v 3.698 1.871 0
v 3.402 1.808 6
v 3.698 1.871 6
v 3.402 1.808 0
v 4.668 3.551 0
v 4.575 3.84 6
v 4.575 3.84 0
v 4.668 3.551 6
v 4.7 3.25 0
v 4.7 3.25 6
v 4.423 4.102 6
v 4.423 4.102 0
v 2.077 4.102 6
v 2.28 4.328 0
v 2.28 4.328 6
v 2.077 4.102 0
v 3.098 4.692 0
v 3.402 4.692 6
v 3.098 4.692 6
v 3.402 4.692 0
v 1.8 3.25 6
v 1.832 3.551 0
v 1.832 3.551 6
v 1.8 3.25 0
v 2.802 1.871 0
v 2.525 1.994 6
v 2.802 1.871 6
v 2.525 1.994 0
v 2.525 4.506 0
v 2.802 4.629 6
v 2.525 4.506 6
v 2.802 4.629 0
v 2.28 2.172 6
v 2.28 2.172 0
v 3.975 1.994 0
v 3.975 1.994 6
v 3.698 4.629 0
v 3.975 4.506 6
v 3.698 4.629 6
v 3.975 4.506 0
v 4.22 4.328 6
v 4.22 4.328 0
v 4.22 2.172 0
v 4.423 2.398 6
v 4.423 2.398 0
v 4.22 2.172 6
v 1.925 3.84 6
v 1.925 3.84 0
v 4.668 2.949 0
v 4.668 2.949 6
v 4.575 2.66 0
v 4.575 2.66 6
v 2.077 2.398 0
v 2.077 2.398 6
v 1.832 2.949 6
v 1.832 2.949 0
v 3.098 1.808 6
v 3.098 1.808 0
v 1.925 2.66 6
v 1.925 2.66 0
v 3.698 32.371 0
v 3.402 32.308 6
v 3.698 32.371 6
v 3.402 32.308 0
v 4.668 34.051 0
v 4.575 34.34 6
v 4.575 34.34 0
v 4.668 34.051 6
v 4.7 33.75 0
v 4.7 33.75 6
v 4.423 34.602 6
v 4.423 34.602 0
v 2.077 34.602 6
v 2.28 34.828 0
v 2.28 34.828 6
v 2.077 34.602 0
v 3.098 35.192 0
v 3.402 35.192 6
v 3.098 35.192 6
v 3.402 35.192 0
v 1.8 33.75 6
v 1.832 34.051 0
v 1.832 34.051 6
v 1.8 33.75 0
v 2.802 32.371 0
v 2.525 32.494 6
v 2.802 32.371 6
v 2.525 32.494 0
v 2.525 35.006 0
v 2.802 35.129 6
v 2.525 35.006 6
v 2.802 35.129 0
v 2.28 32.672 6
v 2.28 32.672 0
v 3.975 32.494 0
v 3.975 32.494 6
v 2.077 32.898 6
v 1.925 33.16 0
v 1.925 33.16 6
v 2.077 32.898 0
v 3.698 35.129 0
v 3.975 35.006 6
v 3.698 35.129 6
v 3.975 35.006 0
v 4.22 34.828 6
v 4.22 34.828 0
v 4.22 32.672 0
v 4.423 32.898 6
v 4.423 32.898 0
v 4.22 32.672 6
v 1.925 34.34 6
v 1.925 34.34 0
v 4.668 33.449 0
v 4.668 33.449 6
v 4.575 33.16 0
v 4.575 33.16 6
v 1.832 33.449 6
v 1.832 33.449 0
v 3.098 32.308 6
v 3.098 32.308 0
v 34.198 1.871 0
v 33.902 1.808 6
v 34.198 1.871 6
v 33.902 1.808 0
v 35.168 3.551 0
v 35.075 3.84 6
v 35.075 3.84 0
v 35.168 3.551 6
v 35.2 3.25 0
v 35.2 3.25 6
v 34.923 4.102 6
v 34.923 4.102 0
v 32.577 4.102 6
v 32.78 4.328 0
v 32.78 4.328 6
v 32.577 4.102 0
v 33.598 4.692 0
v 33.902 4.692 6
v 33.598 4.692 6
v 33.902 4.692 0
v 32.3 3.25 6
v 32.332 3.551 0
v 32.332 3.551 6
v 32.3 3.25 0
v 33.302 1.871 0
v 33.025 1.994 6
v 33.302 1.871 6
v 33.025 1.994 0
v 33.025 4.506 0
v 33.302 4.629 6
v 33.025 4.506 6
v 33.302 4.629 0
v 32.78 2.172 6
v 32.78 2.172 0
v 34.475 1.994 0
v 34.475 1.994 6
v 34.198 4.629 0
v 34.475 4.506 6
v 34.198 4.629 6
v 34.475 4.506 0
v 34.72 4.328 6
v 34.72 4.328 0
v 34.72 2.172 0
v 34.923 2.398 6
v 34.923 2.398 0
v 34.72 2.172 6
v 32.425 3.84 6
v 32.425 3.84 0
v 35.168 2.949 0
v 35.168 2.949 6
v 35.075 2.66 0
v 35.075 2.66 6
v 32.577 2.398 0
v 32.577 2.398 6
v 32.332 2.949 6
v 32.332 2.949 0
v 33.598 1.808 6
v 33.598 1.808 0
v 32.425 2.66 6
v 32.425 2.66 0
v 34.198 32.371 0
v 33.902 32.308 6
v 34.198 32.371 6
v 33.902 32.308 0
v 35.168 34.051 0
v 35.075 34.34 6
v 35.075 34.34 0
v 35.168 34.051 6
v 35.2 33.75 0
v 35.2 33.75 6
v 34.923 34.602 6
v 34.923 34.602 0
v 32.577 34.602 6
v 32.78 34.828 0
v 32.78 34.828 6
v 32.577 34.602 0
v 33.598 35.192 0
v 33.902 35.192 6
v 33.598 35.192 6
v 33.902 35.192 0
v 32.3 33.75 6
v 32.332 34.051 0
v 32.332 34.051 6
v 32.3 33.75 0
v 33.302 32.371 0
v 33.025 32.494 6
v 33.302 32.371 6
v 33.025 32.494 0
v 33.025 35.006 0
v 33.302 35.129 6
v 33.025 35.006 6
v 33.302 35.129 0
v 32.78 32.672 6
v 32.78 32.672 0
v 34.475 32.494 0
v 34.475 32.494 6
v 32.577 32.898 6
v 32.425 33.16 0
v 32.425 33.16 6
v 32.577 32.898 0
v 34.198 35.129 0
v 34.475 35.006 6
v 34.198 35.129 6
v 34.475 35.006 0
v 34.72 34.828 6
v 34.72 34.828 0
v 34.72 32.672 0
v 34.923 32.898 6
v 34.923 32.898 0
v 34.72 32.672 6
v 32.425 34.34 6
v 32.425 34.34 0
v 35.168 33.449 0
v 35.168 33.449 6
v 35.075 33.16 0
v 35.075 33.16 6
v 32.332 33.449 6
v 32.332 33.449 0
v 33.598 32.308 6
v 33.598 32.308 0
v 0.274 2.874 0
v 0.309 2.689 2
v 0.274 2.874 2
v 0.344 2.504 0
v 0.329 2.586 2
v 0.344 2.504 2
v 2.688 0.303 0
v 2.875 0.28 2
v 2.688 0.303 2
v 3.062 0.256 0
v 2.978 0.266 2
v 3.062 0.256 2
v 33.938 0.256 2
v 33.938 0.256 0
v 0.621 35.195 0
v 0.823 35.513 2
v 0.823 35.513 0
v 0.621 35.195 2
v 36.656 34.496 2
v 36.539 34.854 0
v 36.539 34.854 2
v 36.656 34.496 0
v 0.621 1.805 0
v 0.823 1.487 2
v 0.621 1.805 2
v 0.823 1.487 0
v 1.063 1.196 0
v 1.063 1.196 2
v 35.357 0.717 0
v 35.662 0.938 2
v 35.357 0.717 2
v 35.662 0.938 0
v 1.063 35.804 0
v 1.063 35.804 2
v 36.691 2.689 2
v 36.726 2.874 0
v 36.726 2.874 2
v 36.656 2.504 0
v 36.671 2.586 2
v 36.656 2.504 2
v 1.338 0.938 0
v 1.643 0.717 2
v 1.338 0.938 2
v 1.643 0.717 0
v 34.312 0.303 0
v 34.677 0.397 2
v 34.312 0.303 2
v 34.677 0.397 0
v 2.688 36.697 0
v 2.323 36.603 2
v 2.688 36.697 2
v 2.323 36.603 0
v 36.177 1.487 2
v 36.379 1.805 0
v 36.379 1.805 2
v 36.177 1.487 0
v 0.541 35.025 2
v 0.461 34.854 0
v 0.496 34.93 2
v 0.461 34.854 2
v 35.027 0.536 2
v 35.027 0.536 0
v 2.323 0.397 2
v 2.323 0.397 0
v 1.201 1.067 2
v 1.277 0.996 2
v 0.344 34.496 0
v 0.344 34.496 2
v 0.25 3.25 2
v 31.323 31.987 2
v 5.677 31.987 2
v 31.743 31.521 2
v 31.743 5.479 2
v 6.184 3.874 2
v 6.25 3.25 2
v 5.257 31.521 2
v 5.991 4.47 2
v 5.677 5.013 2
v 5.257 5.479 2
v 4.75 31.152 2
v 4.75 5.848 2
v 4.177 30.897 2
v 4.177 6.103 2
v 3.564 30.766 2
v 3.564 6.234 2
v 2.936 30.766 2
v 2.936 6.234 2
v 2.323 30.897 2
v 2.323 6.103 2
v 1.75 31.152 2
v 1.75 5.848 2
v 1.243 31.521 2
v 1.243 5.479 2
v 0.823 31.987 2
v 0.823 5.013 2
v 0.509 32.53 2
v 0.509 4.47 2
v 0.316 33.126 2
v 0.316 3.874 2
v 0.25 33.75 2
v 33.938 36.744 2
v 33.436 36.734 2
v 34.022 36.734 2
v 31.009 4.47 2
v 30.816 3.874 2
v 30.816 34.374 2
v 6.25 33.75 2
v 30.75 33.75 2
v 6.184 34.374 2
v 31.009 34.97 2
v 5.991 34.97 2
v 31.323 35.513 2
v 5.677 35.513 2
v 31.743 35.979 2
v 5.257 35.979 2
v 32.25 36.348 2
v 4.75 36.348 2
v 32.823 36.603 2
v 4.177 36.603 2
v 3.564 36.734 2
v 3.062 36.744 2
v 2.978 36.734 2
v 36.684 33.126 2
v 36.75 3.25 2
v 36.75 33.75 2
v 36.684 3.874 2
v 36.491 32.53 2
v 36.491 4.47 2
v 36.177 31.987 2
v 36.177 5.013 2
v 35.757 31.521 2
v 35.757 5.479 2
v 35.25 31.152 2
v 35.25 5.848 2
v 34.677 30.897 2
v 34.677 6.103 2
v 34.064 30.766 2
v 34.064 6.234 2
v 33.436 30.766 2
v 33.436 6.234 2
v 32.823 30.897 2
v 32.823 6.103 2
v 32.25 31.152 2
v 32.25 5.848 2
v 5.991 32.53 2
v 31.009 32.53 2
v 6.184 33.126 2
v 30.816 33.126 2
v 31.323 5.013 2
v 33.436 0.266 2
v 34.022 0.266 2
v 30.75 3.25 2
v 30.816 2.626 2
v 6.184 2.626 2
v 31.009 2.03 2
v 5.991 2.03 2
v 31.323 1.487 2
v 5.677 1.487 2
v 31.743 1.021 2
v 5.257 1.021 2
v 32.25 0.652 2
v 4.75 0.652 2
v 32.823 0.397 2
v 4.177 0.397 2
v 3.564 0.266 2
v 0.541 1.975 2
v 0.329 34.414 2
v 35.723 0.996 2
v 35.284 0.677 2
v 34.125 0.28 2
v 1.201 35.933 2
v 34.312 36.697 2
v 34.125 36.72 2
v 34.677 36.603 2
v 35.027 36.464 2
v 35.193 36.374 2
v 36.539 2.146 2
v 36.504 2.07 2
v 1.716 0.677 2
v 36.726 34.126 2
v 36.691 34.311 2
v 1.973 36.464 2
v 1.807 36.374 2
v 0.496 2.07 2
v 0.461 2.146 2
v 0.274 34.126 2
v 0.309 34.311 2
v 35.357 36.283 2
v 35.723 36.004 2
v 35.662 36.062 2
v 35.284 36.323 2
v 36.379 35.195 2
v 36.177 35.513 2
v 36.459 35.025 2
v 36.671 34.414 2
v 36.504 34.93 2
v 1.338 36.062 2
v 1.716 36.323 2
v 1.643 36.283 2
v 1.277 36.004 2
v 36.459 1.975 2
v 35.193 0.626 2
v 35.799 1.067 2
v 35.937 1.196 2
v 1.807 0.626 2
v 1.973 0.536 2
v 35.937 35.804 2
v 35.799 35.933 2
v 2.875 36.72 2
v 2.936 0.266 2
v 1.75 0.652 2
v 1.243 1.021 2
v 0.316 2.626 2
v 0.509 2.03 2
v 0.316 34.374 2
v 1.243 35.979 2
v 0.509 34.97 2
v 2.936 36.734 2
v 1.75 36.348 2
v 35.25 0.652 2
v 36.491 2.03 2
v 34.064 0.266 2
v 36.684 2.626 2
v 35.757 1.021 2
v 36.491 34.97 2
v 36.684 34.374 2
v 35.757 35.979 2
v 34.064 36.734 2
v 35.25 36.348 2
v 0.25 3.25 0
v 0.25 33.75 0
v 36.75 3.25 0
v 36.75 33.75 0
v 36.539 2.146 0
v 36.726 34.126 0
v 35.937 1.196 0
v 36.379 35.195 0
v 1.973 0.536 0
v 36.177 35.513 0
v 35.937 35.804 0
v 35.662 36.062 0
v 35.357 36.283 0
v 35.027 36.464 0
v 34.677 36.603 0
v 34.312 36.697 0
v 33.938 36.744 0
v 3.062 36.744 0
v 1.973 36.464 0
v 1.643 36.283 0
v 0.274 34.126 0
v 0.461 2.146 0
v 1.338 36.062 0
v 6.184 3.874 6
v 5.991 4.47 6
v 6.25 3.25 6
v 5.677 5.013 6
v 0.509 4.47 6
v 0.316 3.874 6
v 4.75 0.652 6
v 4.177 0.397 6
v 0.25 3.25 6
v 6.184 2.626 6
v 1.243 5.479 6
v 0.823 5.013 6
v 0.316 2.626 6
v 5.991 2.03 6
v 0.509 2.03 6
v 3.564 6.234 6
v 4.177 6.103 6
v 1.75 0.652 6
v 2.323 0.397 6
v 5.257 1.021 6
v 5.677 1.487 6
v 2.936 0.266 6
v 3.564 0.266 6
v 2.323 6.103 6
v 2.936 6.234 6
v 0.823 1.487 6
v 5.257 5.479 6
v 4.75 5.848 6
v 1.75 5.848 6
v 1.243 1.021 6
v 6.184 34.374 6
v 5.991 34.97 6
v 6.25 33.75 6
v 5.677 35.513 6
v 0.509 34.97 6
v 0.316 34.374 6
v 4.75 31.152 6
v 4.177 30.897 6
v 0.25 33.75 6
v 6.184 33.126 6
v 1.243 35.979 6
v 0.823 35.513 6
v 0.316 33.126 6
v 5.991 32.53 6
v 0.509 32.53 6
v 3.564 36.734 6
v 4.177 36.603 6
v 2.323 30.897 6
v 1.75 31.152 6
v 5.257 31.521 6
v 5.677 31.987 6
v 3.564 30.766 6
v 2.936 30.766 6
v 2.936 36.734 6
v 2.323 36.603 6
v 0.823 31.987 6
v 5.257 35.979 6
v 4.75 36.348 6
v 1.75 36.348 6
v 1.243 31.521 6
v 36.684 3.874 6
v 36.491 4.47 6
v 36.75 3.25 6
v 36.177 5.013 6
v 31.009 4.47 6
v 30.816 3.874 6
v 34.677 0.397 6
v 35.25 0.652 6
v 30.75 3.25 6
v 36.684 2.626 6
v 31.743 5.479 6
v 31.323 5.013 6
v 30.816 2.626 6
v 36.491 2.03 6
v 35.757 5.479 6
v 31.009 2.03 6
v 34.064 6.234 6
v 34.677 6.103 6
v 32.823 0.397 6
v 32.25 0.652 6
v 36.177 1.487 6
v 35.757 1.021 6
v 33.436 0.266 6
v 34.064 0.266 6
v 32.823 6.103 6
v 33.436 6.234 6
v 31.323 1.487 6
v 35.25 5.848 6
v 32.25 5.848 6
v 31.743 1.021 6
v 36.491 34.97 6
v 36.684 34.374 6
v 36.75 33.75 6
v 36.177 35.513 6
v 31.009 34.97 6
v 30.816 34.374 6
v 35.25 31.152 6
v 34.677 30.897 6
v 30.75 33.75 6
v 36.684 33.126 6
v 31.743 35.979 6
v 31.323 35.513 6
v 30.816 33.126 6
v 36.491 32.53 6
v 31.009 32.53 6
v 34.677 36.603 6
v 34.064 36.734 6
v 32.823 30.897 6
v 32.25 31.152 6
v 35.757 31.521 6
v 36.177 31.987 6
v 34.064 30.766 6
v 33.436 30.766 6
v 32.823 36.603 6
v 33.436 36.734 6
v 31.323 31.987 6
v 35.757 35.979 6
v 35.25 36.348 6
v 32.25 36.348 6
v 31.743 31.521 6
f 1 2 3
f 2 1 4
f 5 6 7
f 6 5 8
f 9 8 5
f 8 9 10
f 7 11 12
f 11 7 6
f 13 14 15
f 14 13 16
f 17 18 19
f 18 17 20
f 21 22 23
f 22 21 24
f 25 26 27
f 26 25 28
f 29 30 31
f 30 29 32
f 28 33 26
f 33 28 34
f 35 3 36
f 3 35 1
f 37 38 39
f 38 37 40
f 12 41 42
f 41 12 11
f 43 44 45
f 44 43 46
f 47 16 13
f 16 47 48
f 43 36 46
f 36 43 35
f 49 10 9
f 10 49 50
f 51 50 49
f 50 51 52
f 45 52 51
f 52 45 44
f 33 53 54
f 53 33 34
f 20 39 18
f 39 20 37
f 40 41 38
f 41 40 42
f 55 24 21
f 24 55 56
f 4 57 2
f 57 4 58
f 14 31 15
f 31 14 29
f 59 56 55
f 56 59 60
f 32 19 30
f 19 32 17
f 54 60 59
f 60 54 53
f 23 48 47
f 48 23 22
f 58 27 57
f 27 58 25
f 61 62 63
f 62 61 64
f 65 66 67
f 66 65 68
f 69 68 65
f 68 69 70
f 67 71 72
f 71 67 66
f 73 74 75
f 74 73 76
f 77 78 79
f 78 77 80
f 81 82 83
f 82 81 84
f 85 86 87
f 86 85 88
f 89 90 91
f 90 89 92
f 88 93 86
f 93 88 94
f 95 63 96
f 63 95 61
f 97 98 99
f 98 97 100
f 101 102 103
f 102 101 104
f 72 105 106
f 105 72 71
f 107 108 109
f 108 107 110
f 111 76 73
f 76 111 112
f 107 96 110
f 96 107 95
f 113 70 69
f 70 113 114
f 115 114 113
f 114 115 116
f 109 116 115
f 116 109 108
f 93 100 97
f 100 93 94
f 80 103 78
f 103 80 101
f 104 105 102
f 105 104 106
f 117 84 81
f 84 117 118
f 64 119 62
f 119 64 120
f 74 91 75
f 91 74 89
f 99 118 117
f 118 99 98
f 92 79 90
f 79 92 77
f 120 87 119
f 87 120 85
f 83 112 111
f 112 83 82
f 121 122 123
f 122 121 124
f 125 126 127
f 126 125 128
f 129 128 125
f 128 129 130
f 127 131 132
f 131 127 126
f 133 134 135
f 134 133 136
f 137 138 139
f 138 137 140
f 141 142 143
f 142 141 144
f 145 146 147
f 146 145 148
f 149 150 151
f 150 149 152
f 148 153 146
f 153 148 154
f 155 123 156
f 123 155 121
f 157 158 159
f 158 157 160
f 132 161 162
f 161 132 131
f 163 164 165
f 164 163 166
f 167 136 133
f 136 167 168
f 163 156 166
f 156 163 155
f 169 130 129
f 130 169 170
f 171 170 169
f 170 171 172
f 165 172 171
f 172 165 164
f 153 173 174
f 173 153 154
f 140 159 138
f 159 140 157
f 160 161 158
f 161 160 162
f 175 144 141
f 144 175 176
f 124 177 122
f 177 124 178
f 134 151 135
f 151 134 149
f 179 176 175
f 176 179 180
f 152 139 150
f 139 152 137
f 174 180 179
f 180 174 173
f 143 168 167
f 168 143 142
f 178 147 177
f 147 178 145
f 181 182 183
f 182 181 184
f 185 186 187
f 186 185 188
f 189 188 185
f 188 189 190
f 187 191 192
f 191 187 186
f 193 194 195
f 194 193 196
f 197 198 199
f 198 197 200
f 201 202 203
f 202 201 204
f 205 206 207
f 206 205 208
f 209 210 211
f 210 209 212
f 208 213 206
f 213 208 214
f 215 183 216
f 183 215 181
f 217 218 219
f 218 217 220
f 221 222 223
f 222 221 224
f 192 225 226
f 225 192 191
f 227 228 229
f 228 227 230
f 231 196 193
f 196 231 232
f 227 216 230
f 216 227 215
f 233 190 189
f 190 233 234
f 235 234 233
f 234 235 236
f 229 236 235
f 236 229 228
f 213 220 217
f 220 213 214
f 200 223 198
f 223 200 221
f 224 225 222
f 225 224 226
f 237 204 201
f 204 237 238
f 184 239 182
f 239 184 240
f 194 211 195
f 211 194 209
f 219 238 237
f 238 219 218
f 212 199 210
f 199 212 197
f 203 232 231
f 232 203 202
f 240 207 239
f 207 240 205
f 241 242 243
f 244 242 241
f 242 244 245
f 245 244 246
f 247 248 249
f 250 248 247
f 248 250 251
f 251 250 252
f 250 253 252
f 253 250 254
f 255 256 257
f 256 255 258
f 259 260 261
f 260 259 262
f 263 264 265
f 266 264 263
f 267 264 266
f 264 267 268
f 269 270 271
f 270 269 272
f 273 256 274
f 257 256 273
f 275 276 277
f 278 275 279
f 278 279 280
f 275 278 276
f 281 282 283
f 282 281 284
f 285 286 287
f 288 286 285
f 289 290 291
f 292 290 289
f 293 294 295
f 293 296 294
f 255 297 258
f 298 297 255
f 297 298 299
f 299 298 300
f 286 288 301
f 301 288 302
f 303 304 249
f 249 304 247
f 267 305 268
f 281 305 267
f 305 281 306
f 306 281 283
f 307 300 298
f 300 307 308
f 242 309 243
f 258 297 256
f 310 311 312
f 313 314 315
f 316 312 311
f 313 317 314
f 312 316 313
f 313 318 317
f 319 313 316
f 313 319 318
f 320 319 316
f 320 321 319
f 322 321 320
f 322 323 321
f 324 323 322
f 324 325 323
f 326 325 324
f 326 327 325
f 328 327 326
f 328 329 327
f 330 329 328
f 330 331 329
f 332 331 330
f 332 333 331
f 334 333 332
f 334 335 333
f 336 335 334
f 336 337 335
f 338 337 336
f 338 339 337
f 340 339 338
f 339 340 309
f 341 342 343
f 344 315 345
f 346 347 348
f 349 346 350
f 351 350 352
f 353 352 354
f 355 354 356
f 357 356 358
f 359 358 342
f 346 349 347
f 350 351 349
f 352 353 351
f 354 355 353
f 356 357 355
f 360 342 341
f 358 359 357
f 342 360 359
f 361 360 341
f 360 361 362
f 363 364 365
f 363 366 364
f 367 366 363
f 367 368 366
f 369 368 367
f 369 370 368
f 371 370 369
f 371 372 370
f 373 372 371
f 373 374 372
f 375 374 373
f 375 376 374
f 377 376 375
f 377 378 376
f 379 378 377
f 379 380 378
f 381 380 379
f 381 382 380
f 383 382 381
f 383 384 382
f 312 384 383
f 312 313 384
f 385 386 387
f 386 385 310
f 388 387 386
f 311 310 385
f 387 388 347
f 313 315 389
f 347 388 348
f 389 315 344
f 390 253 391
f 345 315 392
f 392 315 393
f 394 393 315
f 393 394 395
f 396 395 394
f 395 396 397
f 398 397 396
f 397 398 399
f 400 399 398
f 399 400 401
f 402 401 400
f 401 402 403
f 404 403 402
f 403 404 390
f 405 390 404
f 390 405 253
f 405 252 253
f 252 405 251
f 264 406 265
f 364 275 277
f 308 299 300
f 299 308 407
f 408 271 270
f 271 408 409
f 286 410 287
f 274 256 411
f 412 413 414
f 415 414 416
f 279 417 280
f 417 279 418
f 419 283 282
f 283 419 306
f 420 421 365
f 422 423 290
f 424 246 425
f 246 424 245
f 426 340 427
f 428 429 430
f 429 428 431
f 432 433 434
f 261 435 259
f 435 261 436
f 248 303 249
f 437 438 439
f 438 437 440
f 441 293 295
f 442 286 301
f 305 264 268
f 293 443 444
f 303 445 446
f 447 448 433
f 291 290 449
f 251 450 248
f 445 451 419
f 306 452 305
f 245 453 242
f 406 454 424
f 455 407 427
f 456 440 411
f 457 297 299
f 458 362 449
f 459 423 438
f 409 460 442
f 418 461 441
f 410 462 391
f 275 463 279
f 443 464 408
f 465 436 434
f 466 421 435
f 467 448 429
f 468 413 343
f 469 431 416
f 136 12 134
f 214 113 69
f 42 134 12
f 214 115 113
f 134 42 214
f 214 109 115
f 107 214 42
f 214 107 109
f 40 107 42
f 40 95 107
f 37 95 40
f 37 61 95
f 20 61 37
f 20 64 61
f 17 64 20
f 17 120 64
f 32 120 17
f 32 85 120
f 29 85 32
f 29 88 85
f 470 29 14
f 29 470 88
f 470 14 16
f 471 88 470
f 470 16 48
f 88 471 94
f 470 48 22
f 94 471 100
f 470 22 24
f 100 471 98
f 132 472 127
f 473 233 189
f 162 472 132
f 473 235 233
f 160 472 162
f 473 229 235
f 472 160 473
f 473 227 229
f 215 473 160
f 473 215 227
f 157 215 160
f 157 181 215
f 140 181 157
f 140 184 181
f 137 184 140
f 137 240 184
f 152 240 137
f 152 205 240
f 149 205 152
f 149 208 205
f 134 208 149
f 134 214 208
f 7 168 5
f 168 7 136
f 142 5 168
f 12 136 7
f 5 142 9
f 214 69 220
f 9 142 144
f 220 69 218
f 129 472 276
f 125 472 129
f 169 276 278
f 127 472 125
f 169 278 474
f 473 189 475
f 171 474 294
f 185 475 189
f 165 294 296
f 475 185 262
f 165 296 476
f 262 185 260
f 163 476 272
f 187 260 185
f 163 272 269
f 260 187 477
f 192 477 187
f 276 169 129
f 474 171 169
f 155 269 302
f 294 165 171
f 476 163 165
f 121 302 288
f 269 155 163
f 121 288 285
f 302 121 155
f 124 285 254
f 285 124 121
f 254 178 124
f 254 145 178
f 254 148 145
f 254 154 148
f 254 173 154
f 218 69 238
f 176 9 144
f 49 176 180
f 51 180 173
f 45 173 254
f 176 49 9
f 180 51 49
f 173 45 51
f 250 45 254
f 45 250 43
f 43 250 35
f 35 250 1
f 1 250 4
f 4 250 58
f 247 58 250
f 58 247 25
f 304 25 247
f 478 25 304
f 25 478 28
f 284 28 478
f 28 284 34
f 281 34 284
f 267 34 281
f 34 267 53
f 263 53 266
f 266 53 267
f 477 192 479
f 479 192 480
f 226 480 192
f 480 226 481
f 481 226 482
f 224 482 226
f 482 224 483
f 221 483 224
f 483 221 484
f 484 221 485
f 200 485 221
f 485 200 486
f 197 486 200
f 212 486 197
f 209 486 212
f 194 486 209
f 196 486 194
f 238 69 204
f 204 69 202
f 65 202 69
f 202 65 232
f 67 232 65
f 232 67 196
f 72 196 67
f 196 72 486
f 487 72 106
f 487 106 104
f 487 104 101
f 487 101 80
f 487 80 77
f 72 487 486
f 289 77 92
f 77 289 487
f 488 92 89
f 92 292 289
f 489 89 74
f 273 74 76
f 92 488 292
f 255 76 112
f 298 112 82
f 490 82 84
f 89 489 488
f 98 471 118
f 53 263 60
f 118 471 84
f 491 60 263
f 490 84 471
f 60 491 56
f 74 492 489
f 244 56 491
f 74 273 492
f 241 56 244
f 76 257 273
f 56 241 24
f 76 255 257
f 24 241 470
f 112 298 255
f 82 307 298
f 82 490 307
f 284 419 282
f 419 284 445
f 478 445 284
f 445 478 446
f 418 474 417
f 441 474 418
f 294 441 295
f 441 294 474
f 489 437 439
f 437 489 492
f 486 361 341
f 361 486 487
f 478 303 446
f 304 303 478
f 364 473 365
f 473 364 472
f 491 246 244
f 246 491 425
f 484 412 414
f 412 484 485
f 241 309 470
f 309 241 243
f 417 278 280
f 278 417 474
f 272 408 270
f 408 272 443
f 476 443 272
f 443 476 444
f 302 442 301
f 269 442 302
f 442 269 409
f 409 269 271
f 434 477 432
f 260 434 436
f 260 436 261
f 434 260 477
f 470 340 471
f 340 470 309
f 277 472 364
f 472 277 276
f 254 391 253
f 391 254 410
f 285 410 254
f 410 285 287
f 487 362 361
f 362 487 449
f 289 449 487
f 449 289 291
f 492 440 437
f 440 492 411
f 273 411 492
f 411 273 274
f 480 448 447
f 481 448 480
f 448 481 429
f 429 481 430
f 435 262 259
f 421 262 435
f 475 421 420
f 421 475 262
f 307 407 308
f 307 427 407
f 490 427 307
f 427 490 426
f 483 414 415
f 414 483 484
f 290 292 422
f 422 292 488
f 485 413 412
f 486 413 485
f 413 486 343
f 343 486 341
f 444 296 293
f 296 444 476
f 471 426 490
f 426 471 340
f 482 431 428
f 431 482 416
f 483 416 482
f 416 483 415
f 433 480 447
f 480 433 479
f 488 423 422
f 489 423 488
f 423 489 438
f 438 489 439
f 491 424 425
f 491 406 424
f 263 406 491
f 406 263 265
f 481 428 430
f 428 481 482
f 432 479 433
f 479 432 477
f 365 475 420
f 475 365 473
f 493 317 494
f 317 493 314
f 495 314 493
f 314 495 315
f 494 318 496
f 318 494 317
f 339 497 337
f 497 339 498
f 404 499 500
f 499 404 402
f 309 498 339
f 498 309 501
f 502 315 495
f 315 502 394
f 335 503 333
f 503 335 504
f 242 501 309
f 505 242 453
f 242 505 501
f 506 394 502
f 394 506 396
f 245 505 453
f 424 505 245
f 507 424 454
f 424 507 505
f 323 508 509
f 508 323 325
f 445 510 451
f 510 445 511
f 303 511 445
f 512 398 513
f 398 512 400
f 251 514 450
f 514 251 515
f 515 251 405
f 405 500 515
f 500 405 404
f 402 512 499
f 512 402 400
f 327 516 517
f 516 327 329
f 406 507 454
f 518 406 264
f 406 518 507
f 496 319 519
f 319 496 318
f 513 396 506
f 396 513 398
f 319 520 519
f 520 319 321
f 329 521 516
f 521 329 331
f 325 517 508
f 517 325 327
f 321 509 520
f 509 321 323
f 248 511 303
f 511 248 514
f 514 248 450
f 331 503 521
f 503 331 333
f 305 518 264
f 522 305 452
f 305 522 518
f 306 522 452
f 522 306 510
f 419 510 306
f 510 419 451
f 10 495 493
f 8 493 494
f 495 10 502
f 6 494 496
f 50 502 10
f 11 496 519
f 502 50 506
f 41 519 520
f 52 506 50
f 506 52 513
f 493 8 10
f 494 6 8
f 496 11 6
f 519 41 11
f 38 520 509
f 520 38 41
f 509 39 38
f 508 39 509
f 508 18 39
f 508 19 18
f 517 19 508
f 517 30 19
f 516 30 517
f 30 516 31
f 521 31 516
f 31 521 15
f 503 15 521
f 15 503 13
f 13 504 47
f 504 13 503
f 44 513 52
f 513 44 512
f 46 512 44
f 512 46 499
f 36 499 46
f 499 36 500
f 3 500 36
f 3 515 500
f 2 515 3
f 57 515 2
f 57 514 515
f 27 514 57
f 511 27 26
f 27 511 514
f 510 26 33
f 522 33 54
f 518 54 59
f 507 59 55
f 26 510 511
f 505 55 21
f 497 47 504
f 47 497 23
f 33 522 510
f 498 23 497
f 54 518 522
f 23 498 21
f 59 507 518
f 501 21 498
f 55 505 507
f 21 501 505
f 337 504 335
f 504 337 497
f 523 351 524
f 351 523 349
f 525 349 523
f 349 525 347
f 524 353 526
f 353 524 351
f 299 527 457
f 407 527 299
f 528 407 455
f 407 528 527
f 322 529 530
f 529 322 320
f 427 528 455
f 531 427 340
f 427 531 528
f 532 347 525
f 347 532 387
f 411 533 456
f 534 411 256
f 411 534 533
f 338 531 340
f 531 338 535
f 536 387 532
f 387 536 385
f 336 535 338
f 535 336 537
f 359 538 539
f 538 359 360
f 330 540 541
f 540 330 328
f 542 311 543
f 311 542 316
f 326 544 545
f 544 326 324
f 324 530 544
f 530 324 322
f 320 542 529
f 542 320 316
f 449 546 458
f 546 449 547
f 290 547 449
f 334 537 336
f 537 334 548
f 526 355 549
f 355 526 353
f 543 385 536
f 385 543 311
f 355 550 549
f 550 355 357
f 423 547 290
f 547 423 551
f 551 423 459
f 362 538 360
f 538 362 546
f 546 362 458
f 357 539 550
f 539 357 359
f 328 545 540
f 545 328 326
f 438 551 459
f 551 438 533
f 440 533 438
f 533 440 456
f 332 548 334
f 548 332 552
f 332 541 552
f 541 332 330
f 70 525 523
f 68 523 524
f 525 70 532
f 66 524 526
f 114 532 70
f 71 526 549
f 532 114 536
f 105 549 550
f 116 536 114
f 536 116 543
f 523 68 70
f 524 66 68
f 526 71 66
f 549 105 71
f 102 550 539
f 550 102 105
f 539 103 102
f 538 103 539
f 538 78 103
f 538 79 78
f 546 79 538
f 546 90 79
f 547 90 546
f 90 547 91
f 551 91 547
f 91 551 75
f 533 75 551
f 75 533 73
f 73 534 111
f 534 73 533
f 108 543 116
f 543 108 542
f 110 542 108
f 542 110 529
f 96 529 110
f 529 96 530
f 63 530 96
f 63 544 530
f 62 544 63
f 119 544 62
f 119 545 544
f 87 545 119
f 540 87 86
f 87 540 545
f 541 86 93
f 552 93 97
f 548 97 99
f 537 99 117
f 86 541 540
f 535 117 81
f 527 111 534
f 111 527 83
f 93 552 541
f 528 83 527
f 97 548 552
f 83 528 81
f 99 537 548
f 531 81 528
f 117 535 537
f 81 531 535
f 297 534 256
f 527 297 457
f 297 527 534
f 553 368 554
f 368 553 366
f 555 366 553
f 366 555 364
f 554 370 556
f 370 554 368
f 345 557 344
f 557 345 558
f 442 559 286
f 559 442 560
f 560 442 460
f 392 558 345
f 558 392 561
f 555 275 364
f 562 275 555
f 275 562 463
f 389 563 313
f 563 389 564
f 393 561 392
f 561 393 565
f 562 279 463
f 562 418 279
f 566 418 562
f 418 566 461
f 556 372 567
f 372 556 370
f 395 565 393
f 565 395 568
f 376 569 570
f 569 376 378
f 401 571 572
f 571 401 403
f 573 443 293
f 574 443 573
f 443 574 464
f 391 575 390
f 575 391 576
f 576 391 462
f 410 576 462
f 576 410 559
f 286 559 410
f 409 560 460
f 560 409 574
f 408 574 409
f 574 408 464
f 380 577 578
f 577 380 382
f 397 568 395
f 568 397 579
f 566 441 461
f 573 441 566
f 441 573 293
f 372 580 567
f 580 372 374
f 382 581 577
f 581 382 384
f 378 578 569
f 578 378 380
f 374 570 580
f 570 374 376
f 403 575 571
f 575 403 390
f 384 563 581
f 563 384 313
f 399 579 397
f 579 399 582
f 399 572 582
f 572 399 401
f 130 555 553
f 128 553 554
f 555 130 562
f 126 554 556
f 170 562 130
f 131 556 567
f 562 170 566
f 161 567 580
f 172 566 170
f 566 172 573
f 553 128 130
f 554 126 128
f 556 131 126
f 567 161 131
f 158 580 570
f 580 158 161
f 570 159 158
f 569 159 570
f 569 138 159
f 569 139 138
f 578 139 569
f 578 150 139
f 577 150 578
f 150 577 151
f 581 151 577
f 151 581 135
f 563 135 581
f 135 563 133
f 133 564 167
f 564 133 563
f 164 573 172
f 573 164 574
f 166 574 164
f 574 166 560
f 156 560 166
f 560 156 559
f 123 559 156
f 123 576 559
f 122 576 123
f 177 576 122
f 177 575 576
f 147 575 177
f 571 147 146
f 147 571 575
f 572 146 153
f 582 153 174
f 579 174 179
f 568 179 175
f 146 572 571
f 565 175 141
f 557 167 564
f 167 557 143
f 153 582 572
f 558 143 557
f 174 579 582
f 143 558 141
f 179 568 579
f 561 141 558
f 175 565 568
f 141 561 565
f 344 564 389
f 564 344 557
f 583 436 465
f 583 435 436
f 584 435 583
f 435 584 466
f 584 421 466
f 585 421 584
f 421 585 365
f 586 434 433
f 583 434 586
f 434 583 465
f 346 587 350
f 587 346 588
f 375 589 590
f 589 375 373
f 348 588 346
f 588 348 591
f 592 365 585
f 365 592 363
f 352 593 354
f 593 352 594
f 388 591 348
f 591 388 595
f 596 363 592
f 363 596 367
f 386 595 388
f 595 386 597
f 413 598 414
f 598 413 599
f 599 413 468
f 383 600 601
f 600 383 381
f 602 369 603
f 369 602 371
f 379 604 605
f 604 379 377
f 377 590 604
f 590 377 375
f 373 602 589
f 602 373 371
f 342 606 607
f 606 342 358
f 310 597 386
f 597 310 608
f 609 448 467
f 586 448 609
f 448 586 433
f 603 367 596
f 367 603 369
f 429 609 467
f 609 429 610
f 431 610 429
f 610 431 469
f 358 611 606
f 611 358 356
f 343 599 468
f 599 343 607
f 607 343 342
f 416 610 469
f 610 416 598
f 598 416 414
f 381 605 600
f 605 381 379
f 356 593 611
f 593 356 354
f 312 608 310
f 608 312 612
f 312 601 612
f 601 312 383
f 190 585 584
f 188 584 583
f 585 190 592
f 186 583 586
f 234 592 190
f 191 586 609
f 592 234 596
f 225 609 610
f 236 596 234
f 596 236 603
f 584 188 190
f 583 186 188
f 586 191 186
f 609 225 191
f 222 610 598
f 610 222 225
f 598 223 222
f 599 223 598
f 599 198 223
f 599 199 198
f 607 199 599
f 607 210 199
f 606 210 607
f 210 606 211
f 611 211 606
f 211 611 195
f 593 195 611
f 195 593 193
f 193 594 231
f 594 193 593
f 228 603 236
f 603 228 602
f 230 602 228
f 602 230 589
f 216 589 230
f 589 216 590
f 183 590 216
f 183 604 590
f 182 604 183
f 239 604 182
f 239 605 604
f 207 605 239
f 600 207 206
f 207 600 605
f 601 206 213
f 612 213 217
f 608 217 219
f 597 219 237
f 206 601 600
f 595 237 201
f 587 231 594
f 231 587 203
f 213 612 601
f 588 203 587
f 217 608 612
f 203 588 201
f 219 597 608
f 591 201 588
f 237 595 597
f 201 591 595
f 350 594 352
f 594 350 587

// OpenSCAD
base_height=2;
column_height=4;
screw_hole_diameter=2.9;
bh=base_height;
ch=column_height;
shd=screw_hole_diameter;

difference()
{
    translate([3.25,3.25,0])
    {
        $fn=50;
        minkowski()
        {
            cube([30.5,30.5,bh/2]);
            cylinder(r=3,h=bh/2);
        }       
    }
    for(dx=[3.25:30.5:35])
        for(dy=[3.25:30.5:35])
        {
            translate([dx,dy,-0.1]) cylinder(h=bh+0.2,d=shd,$fn=30);
        }
}
 

for(dx=[3.25:30.5:35])
    for(dy=[3.25:30.5:35])
    {
        difference()
        {
            translate([dx,dy,bh]) cylinder(h=ch,d=6,$fn=30);
            translate([dx,dy,bh-0.1]) cylinder(h=ch+0.2,d=shd,$fn=30);
        }
    }
